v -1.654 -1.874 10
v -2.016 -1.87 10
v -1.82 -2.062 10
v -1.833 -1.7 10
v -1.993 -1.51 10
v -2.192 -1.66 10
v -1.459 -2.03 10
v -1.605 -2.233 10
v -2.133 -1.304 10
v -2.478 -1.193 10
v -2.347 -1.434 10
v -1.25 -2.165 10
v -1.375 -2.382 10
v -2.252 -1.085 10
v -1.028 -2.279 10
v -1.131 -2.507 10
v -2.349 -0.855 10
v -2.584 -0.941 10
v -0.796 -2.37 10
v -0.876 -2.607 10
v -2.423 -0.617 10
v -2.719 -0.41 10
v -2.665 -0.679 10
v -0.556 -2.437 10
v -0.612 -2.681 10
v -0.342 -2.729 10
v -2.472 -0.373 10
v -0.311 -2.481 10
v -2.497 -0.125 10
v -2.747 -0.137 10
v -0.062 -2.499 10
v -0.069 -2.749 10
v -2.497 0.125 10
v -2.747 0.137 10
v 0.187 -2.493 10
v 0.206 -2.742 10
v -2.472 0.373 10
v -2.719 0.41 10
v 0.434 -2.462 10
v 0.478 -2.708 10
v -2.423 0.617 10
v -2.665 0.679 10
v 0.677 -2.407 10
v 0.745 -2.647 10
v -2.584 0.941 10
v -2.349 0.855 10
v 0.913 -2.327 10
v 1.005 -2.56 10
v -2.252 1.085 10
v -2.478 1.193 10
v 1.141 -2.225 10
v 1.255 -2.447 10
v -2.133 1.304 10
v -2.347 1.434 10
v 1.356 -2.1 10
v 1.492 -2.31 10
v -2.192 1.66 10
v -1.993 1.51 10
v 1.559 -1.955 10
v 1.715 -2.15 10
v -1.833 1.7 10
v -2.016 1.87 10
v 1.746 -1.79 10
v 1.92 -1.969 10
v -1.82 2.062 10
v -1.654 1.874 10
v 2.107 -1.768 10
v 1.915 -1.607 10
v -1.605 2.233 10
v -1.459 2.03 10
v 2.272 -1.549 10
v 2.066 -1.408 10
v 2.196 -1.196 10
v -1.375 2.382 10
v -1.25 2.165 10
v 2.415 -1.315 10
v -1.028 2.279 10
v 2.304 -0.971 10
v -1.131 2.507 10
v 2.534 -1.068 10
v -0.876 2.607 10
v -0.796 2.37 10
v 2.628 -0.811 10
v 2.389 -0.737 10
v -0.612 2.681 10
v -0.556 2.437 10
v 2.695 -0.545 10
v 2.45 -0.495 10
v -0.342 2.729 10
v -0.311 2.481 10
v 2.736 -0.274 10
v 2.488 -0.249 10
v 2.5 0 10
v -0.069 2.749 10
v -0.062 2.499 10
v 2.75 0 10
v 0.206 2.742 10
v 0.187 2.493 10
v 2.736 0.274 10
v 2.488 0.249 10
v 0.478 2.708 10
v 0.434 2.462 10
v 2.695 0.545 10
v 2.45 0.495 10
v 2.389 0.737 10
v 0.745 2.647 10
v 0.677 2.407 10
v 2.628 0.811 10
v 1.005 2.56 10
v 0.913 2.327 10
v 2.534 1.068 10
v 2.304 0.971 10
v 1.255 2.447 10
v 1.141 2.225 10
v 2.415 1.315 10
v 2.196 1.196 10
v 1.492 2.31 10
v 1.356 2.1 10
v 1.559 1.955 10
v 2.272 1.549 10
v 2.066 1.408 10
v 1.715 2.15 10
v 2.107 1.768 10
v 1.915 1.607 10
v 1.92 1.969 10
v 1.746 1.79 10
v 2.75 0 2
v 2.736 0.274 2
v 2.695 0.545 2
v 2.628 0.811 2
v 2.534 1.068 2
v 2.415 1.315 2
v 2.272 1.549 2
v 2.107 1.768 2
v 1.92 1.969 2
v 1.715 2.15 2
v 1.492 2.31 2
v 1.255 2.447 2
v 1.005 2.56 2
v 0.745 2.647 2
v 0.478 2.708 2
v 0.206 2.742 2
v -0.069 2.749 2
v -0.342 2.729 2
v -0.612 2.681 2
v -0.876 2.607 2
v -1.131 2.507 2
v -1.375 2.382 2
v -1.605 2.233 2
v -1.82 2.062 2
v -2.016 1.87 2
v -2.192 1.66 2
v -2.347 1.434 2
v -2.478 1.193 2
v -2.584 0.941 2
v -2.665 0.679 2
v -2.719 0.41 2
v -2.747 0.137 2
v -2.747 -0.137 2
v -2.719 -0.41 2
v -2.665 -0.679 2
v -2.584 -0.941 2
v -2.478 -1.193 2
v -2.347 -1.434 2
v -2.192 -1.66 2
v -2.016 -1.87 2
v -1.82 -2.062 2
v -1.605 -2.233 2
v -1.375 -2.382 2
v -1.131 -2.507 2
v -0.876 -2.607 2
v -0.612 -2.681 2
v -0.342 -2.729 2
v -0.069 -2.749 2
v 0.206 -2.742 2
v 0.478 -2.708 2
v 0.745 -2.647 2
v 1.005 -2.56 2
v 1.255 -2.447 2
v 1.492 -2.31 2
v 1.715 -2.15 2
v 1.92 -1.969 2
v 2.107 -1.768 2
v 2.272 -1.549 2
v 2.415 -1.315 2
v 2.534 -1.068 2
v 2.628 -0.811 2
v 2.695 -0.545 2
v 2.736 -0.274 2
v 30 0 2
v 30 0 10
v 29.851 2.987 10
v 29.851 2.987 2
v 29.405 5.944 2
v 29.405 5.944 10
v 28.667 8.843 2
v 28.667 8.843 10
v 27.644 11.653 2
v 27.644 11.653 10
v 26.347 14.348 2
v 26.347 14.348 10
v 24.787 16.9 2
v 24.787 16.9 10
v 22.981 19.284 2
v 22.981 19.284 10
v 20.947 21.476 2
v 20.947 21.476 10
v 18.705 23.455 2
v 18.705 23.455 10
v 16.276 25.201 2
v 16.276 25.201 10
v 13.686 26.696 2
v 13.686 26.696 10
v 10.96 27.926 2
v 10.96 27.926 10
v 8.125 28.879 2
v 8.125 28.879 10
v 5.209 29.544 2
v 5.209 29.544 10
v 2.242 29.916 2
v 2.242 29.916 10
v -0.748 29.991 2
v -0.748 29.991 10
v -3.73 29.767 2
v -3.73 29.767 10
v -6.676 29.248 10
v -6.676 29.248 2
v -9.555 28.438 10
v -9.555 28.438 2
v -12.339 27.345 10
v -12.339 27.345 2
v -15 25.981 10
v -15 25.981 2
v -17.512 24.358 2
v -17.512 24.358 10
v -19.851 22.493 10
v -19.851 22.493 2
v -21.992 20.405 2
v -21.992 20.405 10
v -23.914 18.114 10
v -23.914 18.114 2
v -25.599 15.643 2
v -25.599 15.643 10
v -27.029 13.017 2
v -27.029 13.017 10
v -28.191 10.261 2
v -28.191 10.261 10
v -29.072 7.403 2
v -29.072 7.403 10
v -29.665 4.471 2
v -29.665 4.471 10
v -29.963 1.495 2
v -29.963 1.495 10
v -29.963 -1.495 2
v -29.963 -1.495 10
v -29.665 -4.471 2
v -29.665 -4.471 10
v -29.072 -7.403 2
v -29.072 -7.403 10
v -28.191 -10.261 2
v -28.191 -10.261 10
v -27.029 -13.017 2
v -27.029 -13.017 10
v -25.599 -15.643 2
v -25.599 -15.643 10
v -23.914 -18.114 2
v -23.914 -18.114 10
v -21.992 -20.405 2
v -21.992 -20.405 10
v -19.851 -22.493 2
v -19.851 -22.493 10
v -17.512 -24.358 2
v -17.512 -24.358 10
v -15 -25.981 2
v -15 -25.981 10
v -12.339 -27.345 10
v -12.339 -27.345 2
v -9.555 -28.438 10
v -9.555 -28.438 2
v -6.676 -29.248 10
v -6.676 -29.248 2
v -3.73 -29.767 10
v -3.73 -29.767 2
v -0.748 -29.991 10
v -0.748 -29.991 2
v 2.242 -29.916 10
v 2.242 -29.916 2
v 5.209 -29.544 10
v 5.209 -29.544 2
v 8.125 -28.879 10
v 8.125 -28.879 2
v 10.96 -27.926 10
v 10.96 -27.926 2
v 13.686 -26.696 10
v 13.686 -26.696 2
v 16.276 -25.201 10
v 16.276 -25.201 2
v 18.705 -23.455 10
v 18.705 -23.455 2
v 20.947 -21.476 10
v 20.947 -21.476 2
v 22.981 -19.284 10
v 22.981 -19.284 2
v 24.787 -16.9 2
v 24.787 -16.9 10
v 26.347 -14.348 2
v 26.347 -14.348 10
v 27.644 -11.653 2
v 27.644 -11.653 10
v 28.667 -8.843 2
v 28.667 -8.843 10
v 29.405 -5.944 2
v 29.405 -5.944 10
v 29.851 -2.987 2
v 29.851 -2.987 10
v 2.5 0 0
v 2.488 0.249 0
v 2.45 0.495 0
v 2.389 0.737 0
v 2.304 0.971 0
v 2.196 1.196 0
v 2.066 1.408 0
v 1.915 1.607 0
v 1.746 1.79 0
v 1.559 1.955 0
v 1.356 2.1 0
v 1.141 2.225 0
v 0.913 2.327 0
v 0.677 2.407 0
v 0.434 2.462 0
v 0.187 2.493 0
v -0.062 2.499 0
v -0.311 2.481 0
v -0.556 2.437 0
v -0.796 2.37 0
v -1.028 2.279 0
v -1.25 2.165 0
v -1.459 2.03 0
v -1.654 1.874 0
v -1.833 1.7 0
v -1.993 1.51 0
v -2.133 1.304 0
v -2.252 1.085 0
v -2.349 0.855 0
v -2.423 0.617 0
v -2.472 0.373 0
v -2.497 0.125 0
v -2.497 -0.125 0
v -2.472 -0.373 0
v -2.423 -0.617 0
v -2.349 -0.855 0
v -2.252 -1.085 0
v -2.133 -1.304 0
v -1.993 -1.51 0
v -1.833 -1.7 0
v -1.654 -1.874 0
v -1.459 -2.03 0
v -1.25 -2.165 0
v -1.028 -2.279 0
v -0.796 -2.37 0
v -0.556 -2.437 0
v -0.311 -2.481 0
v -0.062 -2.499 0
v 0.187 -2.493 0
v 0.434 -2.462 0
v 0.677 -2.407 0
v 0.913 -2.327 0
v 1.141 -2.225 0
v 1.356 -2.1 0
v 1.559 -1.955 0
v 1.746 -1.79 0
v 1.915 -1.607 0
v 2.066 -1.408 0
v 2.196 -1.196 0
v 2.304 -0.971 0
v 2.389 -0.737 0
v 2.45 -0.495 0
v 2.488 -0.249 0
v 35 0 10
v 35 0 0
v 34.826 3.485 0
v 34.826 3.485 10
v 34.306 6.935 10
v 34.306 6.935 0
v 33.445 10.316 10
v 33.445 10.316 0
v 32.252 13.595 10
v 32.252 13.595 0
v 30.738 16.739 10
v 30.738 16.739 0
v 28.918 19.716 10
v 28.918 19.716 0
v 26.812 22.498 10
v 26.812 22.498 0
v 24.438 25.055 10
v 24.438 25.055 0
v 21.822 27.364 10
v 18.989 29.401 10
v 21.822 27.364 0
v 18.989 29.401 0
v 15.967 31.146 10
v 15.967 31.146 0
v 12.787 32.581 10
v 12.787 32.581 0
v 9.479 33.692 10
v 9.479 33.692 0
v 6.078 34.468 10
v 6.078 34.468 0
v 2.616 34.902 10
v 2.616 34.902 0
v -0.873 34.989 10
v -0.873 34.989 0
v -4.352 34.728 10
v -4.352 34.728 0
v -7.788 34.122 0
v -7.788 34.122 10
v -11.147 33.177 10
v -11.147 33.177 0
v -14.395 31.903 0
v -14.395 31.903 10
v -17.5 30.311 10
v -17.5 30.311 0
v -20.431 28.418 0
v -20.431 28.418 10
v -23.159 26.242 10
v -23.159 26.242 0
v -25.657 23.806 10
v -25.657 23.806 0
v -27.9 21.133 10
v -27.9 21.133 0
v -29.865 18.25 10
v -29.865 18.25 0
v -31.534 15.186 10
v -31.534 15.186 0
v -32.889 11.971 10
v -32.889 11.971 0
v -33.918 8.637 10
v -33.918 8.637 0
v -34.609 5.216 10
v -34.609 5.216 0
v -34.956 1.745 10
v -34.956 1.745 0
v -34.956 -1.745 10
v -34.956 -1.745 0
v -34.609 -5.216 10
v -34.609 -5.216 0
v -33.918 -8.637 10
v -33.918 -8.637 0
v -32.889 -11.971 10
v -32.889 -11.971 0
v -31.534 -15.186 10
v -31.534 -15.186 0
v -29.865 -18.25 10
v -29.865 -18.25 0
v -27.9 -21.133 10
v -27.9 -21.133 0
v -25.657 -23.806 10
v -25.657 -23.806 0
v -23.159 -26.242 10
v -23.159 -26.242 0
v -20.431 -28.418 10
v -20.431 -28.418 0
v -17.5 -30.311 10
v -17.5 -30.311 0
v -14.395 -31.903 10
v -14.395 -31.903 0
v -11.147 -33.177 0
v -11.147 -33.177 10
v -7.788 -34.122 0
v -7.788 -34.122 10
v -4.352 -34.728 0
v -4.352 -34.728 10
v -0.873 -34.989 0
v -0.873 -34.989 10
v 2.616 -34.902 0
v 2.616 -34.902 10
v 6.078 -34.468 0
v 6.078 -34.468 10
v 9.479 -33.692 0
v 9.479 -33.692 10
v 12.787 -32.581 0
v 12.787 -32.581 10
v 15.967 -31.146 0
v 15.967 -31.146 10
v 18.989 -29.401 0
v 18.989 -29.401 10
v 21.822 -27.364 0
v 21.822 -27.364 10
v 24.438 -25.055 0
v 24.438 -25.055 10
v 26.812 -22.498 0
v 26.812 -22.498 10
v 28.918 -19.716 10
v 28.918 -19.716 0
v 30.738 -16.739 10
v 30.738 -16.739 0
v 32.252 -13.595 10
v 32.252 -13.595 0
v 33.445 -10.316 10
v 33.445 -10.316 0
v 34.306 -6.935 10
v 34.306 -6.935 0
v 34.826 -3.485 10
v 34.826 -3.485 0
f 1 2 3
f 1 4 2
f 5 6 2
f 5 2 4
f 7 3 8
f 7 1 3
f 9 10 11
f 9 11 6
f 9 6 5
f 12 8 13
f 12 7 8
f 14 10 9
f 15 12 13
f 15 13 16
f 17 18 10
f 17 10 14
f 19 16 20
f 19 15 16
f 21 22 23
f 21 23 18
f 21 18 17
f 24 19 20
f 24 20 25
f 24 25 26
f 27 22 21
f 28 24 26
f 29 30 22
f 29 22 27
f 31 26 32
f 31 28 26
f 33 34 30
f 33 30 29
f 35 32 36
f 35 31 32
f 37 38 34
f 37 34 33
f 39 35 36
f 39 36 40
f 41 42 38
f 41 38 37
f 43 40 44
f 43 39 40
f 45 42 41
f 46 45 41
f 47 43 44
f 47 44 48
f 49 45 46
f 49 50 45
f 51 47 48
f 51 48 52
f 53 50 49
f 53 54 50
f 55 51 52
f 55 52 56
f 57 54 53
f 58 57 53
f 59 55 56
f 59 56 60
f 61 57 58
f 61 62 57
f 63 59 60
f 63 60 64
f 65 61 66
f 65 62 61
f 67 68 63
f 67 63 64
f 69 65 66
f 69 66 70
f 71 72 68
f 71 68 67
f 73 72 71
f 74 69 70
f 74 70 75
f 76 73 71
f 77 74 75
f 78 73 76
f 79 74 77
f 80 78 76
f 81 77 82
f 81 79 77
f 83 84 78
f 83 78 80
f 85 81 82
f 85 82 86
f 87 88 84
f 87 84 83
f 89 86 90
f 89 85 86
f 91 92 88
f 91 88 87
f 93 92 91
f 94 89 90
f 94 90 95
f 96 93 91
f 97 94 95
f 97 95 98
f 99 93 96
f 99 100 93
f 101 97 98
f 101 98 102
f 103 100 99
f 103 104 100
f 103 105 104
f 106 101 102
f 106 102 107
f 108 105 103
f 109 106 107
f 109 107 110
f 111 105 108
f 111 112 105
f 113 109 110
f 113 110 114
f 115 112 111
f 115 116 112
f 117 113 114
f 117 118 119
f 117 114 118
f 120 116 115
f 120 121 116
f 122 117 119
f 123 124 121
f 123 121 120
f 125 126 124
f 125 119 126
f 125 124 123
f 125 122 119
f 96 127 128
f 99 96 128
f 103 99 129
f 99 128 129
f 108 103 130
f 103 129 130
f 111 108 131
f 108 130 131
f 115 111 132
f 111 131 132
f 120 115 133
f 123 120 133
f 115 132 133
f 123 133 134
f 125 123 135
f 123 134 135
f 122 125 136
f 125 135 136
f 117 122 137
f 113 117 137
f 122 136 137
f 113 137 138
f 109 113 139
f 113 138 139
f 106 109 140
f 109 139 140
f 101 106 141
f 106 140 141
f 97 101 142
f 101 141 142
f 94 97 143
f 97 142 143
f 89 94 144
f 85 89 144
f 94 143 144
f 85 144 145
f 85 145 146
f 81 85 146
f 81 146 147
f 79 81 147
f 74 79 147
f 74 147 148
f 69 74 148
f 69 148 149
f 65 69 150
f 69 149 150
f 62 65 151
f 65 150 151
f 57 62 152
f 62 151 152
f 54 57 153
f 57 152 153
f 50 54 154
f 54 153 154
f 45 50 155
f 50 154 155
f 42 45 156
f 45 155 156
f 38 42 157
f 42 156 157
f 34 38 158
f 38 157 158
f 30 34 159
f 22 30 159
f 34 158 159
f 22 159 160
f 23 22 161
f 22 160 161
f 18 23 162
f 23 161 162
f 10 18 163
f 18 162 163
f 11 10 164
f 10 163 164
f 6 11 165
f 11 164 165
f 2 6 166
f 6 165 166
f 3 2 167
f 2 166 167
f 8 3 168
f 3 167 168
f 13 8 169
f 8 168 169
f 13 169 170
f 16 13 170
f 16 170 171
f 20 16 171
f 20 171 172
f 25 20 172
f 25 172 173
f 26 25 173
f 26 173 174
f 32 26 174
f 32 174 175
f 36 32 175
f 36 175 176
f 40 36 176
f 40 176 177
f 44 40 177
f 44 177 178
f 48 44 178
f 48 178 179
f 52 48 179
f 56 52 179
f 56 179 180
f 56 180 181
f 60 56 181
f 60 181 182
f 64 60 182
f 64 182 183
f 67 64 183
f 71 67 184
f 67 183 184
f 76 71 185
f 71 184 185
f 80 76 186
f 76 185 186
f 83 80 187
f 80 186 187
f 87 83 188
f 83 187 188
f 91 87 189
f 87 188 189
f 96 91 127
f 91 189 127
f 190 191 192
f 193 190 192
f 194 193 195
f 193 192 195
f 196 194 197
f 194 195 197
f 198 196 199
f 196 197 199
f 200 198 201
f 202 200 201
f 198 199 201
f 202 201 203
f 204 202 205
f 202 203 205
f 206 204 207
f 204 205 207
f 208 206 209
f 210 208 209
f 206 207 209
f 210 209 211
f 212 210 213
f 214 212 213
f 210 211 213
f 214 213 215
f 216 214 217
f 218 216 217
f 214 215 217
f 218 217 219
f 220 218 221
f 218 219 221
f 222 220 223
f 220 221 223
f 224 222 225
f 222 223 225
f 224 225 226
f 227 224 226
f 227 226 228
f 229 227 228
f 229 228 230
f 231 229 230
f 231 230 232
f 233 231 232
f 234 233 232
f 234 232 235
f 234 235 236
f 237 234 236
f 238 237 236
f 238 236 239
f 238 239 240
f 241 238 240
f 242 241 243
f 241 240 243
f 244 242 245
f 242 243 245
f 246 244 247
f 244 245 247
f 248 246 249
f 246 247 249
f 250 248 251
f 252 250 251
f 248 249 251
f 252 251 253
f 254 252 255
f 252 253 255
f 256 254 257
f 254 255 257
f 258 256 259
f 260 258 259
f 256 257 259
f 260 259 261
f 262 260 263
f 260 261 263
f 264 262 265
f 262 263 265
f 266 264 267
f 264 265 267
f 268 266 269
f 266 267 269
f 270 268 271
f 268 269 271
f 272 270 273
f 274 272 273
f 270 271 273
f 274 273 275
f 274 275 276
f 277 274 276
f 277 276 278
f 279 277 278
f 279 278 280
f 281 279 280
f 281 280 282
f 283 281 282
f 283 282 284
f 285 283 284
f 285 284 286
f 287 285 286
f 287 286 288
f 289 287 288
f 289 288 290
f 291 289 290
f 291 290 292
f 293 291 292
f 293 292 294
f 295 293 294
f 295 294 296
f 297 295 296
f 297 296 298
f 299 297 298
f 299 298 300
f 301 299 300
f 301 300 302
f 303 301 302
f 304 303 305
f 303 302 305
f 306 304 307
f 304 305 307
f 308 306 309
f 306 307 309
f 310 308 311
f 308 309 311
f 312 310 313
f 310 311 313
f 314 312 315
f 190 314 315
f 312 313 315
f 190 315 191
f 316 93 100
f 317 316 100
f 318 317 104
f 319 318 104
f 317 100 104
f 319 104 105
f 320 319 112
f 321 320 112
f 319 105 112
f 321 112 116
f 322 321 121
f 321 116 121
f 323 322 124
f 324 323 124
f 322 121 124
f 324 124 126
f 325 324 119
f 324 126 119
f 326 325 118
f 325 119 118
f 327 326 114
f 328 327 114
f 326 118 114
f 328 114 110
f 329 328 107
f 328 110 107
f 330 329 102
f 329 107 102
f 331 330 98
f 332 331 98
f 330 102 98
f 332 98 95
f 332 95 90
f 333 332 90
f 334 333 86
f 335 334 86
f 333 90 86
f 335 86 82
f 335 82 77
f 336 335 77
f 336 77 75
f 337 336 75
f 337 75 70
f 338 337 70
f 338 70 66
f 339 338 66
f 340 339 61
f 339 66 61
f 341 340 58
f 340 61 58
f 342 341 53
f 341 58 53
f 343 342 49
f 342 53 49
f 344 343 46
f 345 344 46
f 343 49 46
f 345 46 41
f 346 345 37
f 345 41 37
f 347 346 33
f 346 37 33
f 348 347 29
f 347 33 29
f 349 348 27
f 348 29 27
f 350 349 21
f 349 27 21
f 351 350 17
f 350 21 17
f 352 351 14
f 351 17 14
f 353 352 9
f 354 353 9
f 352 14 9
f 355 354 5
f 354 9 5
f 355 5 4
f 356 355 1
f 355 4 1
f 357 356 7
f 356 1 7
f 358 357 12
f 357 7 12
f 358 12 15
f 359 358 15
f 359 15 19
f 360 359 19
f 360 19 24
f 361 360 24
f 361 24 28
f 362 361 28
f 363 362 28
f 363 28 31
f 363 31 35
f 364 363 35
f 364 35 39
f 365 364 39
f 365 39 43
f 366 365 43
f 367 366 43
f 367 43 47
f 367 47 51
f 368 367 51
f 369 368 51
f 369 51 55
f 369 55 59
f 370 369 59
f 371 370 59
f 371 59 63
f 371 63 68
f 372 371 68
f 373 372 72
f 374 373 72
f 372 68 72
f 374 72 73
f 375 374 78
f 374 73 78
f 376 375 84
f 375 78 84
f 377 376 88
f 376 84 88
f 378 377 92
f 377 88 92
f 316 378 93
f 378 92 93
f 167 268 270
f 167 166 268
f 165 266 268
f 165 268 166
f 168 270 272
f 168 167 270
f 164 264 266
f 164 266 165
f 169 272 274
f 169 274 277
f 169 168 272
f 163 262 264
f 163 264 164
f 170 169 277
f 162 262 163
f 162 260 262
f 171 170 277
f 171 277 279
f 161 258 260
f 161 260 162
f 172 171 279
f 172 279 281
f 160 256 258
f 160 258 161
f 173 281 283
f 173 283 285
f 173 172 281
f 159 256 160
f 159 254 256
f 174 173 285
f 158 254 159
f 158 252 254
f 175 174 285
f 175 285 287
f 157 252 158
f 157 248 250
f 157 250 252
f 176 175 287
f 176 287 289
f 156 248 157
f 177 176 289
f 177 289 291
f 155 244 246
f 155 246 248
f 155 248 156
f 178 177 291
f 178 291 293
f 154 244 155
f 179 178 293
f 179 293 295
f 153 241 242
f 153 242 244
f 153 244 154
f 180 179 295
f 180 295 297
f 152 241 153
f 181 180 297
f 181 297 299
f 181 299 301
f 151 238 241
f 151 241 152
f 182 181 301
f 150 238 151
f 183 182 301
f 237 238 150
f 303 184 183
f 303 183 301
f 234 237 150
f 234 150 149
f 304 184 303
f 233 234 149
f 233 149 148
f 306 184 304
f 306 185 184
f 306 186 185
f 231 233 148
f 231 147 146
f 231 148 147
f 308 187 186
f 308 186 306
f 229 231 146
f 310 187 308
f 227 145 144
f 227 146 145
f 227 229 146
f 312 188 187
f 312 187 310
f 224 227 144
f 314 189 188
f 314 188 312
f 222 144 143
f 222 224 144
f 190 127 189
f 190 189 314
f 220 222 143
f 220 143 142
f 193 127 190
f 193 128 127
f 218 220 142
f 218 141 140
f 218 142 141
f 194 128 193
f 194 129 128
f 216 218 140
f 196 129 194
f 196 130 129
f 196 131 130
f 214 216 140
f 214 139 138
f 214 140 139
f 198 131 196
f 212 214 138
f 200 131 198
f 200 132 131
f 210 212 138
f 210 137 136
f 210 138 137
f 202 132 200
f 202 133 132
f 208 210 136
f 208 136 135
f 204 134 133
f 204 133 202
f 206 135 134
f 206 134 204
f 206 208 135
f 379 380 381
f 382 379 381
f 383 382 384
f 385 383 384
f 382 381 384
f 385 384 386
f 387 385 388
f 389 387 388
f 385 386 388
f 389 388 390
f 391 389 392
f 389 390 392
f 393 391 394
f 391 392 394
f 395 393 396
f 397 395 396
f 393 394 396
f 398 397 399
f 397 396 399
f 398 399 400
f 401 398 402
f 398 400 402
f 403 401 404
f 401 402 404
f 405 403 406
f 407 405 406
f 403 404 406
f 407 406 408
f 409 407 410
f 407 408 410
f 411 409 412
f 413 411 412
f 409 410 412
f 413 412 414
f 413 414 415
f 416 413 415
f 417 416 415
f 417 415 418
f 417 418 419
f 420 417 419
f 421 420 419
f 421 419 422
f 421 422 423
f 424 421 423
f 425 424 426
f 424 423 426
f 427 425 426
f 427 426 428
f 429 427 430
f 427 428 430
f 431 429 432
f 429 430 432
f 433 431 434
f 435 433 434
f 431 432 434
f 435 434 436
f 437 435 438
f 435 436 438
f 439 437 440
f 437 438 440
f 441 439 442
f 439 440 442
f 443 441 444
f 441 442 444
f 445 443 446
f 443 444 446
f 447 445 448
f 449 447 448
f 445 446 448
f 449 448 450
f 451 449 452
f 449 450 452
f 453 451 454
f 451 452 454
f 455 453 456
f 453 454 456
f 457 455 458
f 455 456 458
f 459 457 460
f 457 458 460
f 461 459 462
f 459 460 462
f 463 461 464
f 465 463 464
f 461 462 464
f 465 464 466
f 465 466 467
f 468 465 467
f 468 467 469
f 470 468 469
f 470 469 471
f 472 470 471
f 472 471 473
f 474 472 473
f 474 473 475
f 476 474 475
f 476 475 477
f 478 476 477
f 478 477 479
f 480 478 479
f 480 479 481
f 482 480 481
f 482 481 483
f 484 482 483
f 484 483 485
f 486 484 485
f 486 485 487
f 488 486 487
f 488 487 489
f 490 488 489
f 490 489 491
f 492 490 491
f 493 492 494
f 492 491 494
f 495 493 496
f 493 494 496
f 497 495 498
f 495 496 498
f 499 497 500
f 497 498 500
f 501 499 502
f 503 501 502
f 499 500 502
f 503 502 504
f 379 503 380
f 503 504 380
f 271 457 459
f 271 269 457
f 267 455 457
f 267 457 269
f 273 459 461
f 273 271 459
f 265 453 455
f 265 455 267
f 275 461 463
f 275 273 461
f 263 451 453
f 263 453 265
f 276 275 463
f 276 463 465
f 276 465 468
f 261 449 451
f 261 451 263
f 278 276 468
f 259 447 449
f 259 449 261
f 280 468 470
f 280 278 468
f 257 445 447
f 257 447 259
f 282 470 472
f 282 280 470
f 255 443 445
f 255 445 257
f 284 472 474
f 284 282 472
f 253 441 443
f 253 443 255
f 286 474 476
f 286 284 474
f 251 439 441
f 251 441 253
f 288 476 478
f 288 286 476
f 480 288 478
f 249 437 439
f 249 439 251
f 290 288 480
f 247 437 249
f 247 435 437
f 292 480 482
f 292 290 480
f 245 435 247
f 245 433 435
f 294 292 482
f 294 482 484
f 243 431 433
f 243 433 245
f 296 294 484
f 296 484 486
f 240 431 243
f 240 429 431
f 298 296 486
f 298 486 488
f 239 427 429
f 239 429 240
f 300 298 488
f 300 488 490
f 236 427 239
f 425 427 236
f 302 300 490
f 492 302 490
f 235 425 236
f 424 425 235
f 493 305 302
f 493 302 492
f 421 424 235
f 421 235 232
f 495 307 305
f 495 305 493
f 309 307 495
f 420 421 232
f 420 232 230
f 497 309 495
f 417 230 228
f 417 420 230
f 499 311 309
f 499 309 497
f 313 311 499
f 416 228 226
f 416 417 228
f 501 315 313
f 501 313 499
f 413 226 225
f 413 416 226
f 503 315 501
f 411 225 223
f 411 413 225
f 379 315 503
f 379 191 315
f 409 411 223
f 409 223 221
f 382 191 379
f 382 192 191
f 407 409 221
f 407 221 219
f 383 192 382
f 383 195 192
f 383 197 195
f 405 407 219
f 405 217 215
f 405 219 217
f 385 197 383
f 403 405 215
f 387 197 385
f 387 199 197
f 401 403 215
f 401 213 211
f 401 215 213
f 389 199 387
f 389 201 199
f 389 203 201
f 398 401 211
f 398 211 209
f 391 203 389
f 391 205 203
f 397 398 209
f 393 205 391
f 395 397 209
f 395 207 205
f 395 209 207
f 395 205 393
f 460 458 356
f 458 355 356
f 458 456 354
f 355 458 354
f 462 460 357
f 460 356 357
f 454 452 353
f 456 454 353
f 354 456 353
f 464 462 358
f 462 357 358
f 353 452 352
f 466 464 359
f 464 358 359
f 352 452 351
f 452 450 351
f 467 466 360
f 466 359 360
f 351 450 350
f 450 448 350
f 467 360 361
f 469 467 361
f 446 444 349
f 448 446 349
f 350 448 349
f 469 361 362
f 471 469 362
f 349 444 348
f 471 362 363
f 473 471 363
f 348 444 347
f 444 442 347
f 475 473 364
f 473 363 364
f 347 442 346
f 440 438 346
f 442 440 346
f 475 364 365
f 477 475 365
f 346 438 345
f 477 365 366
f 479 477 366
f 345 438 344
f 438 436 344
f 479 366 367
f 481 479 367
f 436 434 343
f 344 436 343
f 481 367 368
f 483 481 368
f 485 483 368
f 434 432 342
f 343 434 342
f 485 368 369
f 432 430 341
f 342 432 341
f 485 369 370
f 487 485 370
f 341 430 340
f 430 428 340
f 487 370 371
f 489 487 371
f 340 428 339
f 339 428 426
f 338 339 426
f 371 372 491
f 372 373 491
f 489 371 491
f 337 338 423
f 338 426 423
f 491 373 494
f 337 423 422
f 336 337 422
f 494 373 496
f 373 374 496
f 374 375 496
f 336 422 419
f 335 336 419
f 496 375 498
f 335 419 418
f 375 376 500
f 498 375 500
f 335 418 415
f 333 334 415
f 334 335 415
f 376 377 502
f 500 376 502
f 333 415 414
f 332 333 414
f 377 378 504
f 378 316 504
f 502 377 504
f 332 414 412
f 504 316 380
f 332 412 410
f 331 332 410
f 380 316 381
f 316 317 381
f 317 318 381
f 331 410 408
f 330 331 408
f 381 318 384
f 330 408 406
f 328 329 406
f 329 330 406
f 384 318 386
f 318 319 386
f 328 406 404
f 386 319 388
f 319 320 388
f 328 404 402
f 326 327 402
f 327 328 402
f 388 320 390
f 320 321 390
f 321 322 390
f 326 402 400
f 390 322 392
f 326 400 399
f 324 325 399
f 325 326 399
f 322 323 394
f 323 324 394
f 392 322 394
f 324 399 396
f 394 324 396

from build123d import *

# Parameters (mm, degrees)
F0_R     = 35
F1_DEPTH = 10
F2_R     = 30
F3_DEPTH = 8
F4_R     = 2.75
F5_DEPTH = 8
F6_R     = 2.5
F7_DEPTH = 10


with BuildPart() as f1:
    # F0 (on Top) → F1 (new body)
    with BuildSketch(Plane.XY):
        Circle(F0_R)
    extrude(amount=F1_DEPTH)

    # F2 (on face) → F3 (cut)
    with BuildSketch(Plane.XY.offset(10)):
        Circle(F2_R)
    extrude(amount=-F3_DEPTH, mode=Mode.SUBTRACT)

    # F4 (on face) → F5 (join)
    with BuildSketch(Plane.XY.offset(2)):
        Circle(F4_R)
    extrude(amount=F5_DEPTH)

    # F6 (on face) → F7 (cut)
    with BuildSketch(Plane.XY.offset(10)):
        Circle(F6_R)
    extrude(amount=-F7_DEPTH, mode=Mode.SUBTRACT)


solid = f1.part
